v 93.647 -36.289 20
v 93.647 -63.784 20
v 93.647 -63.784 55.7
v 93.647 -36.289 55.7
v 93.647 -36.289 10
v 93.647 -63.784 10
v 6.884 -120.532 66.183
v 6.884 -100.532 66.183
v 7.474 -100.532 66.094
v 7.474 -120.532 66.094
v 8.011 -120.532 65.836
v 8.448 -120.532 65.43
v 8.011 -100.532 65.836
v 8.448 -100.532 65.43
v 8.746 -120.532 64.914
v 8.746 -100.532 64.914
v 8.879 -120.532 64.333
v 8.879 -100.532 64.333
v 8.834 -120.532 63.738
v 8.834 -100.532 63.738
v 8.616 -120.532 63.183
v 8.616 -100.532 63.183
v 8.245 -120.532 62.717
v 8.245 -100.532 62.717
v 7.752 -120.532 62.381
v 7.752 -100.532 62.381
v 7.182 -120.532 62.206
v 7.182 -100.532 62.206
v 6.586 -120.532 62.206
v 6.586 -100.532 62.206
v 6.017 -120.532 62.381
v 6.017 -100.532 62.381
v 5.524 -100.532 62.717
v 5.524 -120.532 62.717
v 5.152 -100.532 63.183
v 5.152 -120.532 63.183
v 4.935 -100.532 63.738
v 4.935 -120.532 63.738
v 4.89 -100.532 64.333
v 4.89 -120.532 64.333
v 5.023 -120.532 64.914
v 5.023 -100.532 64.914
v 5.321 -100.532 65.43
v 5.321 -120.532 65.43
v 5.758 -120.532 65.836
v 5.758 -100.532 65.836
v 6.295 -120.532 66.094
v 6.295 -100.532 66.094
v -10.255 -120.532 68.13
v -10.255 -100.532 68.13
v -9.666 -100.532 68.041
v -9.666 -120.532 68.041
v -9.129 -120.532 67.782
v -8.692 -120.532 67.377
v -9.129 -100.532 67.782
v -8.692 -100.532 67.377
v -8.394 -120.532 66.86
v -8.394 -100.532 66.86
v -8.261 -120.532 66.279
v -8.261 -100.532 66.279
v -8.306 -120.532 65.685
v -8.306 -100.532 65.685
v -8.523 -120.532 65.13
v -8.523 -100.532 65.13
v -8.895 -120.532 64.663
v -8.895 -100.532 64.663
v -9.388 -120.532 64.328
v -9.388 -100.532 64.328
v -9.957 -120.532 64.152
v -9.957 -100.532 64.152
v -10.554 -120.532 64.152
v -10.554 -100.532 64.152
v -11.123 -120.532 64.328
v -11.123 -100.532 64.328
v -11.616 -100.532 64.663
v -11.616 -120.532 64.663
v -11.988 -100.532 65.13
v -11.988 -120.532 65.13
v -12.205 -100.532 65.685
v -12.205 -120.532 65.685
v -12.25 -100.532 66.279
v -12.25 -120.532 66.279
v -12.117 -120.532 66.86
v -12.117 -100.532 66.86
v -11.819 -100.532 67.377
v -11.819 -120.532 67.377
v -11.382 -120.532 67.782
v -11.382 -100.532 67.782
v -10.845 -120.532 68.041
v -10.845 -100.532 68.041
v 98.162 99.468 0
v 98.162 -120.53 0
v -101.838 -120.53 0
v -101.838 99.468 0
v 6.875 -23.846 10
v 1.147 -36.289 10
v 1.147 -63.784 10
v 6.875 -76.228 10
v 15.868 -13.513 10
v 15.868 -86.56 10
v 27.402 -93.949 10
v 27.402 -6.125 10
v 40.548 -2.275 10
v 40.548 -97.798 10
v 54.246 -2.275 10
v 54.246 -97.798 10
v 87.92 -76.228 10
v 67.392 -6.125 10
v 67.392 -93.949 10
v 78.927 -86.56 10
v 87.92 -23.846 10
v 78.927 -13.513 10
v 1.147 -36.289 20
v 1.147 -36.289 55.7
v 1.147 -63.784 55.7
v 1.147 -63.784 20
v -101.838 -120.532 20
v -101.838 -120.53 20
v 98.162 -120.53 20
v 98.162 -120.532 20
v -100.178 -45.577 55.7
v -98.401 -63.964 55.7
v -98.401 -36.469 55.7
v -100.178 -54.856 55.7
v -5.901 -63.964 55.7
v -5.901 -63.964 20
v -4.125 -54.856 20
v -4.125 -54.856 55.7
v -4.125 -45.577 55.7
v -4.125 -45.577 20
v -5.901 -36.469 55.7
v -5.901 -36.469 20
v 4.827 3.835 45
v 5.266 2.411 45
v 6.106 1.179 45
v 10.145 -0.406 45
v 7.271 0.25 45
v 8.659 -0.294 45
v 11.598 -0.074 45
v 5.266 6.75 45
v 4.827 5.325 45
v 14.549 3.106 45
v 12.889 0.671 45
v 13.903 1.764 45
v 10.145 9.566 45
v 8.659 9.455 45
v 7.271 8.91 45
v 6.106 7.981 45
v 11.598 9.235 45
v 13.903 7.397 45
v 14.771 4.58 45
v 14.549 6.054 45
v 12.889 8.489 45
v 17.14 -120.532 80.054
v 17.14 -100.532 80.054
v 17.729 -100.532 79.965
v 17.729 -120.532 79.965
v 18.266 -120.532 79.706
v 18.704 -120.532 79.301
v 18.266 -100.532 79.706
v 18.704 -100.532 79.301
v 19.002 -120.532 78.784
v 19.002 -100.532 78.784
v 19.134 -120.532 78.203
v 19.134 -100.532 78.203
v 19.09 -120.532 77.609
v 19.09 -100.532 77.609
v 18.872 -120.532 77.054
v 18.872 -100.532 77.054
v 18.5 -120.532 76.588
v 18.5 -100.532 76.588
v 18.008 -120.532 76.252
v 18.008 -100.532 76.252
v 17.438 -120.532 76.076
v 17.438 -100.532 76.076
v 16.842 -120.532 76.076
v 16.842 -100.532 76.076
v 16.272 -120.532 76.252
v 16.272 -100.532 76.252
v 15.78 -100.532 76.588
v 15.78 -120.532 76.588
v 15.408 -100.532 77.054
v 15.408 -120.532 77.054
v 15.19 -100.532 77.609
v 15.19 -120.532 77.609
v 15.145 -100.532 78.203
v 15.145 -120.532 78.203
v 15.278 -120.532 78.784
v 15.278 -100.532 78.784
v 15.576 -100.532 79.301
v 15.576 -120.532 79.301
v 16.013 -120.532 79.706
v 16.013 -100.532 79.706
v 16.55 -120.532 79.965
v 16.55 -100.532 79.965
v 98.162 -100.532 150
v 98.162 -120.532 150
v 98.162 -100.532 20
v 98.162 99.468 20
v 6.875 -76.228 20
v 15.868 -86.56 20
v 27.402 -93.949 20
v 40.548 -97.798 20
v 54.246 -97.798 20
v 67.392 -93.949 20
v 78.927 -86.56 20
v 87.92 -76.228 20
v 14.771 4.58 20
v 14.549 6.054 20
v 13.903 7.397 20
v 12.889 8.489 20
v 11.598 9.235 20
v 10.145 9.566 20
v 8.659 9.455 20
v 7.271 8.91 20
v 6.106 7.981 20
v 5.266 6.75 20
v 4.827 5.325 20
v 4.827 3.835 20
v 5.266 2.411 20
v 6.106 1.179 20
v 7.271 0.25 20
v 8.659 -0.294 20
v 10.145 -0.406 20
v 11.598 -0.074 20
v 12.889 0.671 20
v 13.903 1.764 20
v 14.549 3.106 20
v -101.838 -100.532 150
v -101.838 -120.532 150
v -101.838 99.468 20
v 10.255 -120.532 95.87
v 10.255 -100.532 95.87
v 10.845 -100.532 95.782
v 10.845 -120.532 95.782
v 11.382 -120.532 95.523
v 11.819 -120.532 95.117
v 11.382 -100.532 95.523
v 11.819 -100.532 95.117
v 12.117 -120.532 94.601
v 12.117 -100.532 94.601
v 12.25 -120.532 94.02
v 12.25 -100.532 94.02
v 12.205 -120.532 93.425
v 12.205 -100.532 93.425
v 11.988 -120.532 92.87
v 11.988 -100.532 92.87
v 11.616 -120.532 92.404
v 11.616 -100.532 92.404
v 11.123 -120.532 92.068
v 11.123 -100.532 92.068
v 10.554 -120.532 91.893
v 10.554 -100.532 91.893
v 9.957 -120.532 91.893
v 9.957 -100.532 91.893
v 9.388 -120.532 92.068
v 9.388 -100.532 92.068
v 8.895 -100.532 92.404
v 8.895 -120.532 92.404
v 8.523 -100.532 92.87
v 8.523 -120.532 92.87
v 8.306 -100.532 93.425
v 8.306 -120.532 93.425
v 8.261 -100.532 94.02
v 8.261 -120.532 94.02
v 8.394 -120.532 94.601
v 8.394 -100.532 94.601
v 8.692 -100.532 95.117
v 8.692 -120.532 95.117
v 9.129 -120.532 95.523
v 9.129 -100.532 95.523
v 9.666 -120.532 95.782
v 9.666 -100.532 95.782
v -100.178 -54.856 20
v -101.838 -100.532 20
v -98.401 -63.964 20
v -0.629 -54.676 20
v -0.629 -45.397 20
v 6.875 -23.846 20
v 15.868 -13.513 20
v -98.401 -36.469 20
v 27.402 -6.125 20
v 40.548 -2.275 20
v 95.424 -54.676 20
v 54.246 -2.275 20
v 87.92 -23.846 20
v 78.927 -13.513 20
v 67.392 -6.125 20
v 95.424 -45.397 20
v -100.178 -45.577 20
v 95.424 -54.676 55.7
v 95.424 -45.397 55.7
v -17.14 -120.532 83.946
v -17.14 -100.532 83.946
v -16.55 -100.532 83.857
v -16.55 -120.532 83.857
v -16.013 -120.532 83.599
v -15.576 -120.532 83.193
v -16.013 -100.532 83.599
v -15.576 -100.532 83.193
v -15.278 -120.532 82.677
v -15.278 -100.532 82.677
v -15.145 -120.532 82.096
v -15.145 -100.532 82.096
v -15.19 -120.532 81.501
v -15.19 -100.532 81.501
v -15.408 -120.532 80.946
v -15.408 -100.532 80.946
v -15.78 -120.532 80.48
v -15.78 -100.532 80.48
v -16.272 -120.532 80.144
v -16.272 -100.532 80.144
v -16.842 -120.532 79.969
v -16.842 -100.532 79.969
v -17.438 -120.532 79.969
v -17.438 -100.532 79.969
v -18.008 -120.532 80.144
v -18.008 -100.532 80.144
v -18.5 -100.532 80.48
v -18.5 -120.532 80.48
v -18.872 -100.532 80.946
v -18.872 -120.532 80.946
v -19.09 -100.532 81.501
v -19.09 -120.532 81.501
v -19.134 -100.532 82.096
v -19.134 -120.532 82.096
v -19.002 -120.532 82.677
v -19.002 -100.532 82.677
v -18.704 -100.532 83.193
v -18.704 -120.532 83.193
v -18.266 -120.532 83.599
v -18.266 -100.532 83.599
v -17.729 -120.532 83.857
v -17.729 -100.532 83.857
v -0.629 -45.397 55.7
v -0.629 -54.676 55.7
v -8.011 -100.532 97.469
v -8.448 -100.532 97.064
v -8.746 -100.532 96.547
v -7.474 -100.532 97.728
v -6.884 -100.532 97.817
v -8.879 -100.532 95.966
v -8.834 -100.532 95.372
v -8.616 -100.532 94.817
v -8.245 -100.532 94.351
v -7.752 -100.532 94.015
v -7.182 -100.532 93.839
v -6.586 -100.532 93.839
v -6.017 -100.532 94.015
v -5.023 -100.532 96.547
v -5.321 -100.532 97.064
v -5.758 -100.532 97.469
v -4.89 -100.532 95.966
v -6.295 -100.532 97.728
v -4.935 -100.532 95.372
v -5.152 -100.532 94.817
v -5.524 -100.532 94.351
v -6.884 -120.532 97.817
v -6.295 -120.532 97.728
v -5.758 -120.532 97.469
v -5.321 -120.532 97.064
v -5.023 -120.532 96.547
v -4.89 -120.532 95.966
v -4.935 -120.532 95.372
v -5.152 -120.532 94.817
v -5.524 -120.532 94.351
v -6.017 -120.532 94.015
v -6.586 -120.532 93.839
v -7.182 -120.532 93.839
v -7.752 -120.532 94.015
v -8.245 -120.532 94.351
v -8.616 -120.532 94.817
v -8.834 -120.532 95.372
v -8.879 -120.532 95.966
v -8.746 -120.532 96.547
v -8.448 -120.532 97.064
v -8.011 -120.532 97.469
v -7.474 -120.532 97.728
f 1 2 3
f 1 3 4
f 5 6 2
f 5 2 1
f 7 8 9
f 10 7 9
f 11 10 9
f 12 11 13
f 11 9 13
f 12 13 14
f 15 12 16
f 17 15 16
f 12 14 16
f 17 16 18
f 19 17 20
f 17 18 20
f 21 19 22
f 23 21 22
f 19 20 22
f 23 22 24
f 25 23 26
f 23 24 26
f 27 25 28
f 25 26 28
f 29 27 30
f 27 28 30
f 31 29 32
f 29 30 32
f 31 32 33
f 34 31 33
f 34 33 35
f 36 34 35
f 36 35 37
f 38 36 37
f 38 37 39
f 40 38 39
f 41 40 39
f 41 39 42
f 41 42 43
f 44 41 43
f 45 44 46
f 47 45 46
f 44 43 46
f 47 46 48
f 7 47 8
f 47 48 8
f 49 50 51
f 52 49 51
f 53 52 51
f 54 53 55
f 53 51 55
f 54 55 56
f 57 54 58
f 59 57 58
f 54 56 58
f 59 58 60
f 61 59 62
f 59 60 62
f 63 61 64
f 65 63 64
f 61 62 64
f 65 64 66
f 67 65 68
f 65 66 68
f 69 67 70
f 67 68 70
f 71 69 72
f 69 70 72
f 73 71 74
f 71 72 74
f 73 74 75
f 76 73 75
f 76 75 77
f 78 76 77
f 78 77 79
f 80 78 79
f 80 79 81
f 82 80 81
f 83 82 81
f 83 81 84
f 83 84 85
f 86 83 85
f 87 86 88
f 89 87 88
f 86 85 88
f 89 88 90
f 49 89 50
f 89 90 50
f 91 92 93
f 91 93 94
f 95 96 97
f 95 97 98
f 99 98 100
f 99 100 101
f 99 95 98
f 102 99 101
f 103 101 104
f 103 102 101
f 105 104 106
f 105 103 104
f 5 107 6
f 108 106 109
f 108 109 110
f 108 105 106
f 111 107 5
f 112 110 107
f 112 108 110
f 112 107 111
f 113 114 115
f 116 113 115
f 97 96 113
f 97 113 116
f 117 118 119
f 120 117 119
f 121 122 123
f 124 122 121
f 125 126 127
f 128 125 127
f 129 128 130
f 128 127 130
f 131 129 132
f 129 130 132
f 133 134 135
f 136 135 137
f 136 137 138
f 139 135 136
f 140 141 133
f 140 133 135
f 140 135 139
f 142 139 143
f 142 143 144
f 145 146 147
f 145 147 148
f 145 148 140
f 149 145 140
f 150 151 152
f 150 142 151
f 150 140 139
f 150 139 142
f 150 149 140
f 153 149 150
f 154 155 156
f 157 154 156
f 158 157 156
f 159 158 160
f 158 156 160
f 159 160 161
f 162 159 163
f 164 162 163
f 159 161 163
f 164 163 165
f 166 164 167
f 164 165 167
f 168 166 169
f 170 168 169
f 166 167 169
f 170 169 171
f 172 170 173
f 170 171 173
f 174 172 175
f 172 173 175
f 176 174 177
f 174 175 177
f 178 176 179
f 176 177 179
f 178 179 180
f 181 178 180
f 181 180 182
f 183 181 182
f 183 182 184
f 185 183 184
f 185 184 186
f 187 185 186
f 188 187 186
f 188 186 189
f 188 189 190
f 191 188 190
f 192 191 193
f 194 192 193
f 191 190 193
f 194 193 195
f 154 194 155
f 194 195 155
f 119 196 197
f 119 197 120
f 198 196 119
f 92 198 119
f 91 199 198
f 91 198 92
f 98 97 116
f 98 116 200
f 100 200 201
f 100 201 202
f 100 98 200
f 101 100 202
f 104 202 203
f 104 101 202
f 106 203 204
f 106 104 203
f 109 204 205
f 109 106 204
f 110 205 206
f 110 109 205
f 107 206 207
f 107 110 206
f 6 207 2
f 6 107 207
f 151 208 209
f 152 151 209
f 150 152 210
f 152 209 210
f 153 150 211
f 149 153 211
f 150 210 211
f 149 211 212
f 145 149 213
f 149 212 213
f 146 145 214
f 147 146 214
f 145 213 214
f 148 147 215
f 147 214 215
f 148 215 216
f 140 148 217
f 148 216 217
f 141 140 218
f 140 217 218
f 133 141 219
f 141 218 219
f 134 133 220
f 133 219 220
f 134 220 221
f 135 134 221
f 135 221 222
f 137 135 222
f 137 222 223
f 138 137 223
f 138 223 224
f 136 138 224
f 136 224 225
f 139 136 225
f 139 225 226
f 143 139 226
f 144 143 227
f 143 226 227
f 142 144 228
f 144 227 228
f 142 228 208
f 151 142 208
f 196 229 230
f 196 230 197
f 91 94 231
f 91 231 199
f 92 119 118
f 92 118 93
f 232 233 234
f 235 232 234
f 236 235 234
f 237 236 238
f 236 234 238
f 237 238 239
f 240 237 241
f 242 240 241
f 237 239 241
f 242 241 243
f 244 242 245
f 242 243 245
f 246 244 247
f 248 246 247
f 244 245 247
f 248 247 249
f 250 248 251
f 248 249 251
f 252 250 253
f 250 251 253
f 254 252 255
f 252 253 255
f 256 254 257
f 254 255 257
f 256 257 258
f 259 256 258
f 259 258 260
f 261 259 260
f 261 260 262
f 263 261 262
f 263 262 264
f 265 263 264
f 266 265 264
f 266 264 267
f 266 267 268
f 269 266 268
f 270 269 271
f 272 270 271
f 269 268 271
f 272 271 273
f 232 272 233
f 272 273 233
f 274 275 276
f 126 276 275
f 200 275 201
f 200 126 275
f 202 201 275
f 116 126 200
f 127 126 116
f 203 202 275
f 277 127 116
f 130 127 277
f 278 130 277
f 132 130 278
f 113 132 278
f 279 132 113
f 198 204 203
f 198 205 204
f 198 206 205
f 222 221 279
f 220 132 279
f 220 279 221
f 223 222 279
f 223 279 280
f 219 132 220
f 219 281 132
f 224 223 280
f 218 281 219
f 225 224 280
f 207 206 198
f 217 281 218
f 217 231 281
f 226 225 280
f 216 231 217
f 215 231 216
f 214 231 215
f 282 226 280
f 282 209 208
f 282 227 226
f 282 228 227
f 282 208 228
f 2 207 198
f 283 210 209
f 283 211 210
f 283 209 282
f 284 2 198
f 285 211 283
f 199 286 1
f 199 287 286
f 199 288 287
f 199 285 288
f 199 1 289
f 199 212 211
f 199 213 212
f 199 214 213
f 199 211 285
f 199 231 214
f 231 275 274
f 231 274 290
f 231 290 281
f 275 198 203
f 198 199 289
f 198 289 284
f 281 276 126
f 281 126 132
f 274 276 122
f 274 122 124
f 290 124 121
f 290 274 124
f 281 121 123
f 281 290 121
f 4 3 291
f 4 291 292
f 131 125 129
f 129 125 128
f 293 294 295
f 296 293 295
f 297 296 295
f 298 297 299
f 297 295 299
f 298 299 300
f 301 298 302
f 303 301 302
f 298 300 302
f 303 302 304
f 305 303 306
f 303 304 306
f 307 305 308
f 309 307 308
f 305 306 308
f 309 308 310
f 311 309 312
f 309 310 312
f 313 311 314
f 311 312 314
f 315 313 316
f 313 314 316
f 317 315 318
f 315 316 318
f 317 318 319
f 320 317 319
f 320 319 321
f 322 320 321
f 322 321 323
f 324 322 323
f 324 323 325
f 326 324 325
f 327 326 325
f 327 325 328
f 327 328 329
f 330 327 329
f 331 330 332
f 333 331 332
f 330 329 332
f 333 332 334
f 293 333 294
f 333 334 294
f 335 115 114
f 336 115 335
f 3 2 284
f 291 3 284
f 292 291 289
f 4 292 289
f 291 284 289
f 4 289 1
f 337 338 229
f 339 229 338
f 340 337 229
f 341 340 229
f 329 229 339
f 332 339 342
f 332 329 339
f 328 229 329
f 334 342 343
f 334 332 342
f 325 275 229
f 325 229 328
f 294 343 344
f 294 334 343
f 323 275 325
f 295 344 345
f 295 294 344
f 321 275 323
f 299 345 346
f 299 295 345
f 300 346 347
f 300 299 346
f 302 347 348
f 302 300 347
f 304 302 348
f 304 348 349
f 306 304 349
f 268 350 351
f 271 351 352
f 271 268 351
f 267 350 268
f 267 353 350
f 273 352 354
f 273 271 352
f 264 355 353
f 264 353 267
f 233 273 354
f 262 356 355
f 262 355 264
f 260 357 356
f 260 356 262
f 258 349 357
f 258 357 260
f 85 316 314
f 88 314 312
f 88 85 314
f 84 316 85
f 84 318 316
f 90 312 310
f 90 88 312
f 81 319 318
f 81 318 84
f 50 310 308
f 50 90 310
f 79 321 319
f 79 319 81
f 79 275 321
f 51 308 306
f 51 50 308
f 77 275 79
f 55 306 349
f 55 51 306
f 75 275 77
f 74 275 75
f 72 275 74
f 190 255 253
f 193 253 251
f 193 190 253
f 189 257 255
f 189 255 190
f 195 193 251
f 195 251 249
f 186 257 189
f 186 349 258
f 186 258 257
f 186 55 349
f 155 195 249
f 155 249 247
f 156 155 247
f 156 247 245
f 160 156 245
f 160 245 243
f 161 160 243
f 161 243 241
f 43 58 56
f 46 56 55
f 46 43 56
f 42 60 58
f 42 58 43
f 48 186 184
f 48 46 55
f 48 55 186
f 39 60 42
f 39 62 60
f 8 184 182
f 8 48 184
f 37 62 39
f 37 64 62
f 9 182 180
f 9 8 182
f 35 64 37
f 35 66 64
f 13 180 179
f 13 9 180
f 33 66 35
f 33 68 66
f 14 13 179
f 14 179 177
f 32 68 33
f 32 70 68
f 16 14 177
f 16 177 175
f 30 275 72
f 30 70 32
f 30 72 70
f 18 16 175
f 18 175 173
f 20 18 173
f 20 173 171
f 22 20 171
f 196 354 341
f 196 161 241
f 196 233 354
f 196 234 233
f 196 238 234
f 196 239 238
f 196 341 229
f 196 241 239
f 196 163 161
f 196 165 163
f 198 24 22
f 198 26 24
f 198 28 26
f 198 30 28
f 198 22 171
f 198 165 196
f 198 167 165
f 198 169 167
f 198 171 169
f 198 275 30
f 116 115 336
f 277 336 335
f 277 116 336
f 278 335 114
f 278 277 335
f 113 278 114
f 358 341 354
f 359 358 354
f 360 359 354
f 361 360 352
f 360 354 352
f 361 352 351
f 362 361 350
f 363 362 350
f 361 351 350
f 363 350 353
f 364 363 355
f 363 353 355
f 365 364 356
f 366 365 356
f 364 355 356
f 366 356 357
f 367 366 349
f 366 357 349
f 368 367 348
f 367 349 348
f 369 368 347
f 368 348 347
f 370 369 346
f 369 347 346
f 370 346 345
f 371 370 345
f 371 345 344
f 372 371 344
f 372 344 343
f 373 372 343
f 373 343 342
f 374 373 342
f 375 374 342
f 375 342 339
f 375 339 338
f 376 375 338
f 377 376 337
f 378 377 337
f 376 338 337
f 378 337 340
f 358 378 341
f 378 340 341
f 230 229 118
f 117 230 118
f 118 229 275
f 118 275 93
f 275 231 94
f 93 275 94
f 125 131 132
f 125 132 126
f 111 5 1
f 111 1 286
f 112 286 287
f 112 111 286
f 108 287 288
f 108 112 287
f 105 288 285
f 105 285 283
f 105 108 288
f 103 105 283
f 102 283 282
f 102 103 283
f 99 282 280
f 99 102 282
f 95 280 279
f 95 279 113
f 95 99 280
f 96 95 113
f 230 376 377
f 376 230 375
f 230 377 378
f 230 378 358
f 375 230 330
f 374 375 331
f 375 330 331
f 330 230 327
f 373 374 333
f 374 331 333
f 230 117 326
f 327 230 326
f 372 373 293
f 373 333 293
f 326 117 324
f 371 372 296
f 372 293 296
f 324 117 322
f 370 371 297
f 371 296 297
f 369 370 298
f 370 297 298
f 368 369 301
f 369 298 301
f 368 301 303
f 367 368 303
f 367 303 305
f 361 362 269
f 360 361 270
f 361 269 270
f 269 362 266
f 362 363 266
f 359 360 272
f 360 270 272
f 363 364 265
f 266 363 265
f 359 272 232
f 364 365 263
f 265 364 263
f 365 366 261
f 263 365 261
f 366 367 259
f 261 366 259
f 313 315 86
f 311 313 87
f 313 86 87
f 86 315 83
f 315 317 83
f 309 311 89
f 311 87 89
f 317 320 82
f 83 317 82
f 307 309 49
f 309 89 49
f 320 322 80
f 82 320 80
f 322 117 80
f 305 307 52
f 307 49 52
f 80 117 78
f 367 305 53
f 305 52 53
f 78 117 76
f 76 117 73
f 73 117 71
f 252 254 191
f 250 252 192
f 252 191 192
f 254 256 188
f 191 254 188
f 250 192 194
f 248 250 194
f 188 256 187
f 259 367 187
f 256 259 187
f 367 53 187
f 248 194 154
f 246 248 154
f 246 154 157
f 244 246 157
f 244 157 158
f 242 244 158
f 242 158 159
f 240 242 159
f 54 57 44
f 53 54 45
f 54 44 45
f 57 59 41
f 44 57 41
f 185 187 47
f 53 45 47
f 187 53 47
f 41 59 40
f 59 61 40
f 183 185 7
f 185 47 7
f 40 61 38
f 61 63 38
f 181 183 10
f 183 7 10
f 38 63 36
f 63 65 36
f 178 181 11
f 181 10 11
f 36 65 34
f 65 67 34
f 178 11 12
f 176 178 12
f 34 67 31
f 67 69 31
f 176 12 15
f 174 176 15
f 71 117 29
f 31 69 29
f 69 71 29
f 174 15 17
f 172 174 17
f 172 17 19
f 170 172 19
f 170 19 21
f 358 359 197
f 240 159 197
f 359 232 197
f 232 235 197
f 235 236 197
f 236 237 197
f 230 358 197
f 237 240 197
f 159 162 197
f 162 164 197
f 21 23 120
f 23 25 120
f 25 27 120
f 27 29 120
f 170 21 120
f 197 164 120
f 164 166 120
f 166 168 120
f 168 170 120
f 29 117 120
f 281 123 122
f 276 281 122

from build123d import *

# Parameters (mm, degrees)
SKETCH_1_W          = 200
SKETCH_1_H          = 200
EXTRUDE_2_DEPTH     = 20
EXTRUDE_5_DEPTH     = 35.7
EXTRUDE_7_DEPTH     = 35.7
SKETCH_16_W         = 200
SKETCH_16_H         = 20
EXTRUDE_9_DEPTH     = 130
SKETCH_17_W         = 20
SKETCH_17_H         = 19.997799489
EXTRUDE_10_DEPTH    = 200
SKETCH_18_R         = 2
CUT_EXTRUDE_3_DEPTH = 20
CUT_EXTRUDE_START   = -10
CUT_EXTRUDE_4_DEPTH = 10
SKETCH_20_R         = 5
EXTRUDE_11_DEPTH    = 25


with BuildPart() as part:
    # 草图1 → 凸台-拉伸2 (new body)
    with BuildSketch(Plane.XY):
        with Locations((-1.837901133, -0.53181486)):
            Rectangle(SKETCH_1_W, SKETCH_1_H)
    extrude(amount=EXTRUDE_2_DEPTH)

    # 草图7 → 凸台-拉伸5 (add)
    with BuildSketch(Plane.XY.offset(20)):
        with BuildLine():
            Line((1.147412205, -36.2889375), (1.147412205, -63.78439167))
            ThreePointArc((1.147412205, -63.78439167), (-0.852587795, -50.036664585), (1.147412205, -36.2889375))
        make_face()
        with BuildLine():
            Line((93.647412205, -36.2889375), (93.647412205, -63.78439167))
            ThreePointArc((93.647412205, -63.78439167), (95.647412205, -50.036664585), (93.647412205, -36.2889375))
        make_face()
    extrude(amount=EXTRUDE_5_DEPTH)

    # 草图11 → 凸台-拉伸7 (add)
    with BuildSketch(Plane.XY.offset(20)):
        with BuildLine():
            Line((-98.401360019, -36.468628425), (-98.401360019, -63.964082595))
            ThreePointArc((-98.401360019, -63.964082595), (-100.401360019, -50.21635551), (-98.401360019, -36.468628425))
        make_face()
        with BuildLine():
            Line((-5.901360019, -36.468628425), (-5.901360019, -63.964082595))
            ThreePointArc((-5.901360019, -63.964082595), (-3.901360019, -50.21635551), (-5.901360019, -36.468628425))
        make_face()
    extrude(amount=EXTRUDE_7_DEPTH)



with BuildPart() as body_2:
    # 草图16 → 凸台-拉伸9 (new body)
    with BuildSketch(Plane.XY.offset(20)):
        with Locations((-1.837901133, -110.53181486)):
            Rectangle(SKETCH_16_W, SKETCH_16_H)
    extrude(amount=EXTRUDE_9_DEPTH)


with BuildPart() as part_1:
    add(part.part)

    add(body_2.part)  # 凸台-拉伸10 merges body 2
    # 草图17 → 凸台-拉伸10 (add)
    with BuildSketch(Plane(origin=(98.162098867, 0, 0), x_dir=(0, 0, -1), z_dir=(1, 0, 0))):
        with Locations((-10, -110.530714605)):
            Rectangle(SKETCH_17_W, SKETCH_17_H)
    extrude(amount=-EXTRUDE_10_DEPTH)

    # 草图18 → 切除-拉伸3 (cut)
    with BuildSketch(Plane(origin=(0, -100.53181486, 0), x_dir=(1, 0, 0), z_dir=(0, 1, 0))):
        with Locations(Location((-17.139851229, -81.946278464, 0), (0, 0, 270))):
            Circle(SKETCH_18_R)
        with Locations(Location((-10.255452207, -66.129592651, 0), (0, 0, 270))):
            Circle(SKETCH_18_R)
        with Locations(Location((6.884399022, -64.183314187, 0), (0, 0, 270))):
            Circle(SKETCH_18_R)
        with Locations(Location((17.139851229, -78.053721536, 0), (0, 0, 270))):
            Circle(SKETCH_18_R)
        with Locations(Location((10.255452207, -93.870407349, 0), (0, 0, 270))):
            Circle(SKETCH_18_R)
        with Locations(Location((-6.884399022, -95.816685813, 0), (0, 0, 270))):
            Circle(SKETCH_18_R)
    extrude(amount=-CUT_EXTRUDE_3_DEPTH, mode=Mode.SUBTRACT)

    # 草图14 → 切除-拉伸4 (cut)
    with BuildSketch(Plane.XY.offset(20).offset(CUT_EXTRUDE_START)):
        with BuildLine():
            Line((1.147412205, -36.2889375), (1.147412205, -63.78439167))
            ThreePointArc((1.147412205, -63.78439167), (47.397412205, -98.286664585), (93.647412205, -63.78439167))
            Line((93.647412205, -63.78439167), (93.647412205, -36.2889375))
            ThreePointArc((93.647412205, -36.2889375), (47.397412205, -1.786664585), (1.147412205, -36.2889375))
        make_face()
    extrude(amount=CUT_EXTRUDE_4_DEPTH, mode=Mode.SUBTRACT)

    # 草图20 → 凸台-拉伸11 (add)
    with BuildSketch(Plane.XY.offset(20)):
        with Locations((9.771333485, 4.580206065)):
            Circle(SKETCH_20_R)
    extrude(amount=EXTRUDE_11_DEPTH)


solid = part_1.part
